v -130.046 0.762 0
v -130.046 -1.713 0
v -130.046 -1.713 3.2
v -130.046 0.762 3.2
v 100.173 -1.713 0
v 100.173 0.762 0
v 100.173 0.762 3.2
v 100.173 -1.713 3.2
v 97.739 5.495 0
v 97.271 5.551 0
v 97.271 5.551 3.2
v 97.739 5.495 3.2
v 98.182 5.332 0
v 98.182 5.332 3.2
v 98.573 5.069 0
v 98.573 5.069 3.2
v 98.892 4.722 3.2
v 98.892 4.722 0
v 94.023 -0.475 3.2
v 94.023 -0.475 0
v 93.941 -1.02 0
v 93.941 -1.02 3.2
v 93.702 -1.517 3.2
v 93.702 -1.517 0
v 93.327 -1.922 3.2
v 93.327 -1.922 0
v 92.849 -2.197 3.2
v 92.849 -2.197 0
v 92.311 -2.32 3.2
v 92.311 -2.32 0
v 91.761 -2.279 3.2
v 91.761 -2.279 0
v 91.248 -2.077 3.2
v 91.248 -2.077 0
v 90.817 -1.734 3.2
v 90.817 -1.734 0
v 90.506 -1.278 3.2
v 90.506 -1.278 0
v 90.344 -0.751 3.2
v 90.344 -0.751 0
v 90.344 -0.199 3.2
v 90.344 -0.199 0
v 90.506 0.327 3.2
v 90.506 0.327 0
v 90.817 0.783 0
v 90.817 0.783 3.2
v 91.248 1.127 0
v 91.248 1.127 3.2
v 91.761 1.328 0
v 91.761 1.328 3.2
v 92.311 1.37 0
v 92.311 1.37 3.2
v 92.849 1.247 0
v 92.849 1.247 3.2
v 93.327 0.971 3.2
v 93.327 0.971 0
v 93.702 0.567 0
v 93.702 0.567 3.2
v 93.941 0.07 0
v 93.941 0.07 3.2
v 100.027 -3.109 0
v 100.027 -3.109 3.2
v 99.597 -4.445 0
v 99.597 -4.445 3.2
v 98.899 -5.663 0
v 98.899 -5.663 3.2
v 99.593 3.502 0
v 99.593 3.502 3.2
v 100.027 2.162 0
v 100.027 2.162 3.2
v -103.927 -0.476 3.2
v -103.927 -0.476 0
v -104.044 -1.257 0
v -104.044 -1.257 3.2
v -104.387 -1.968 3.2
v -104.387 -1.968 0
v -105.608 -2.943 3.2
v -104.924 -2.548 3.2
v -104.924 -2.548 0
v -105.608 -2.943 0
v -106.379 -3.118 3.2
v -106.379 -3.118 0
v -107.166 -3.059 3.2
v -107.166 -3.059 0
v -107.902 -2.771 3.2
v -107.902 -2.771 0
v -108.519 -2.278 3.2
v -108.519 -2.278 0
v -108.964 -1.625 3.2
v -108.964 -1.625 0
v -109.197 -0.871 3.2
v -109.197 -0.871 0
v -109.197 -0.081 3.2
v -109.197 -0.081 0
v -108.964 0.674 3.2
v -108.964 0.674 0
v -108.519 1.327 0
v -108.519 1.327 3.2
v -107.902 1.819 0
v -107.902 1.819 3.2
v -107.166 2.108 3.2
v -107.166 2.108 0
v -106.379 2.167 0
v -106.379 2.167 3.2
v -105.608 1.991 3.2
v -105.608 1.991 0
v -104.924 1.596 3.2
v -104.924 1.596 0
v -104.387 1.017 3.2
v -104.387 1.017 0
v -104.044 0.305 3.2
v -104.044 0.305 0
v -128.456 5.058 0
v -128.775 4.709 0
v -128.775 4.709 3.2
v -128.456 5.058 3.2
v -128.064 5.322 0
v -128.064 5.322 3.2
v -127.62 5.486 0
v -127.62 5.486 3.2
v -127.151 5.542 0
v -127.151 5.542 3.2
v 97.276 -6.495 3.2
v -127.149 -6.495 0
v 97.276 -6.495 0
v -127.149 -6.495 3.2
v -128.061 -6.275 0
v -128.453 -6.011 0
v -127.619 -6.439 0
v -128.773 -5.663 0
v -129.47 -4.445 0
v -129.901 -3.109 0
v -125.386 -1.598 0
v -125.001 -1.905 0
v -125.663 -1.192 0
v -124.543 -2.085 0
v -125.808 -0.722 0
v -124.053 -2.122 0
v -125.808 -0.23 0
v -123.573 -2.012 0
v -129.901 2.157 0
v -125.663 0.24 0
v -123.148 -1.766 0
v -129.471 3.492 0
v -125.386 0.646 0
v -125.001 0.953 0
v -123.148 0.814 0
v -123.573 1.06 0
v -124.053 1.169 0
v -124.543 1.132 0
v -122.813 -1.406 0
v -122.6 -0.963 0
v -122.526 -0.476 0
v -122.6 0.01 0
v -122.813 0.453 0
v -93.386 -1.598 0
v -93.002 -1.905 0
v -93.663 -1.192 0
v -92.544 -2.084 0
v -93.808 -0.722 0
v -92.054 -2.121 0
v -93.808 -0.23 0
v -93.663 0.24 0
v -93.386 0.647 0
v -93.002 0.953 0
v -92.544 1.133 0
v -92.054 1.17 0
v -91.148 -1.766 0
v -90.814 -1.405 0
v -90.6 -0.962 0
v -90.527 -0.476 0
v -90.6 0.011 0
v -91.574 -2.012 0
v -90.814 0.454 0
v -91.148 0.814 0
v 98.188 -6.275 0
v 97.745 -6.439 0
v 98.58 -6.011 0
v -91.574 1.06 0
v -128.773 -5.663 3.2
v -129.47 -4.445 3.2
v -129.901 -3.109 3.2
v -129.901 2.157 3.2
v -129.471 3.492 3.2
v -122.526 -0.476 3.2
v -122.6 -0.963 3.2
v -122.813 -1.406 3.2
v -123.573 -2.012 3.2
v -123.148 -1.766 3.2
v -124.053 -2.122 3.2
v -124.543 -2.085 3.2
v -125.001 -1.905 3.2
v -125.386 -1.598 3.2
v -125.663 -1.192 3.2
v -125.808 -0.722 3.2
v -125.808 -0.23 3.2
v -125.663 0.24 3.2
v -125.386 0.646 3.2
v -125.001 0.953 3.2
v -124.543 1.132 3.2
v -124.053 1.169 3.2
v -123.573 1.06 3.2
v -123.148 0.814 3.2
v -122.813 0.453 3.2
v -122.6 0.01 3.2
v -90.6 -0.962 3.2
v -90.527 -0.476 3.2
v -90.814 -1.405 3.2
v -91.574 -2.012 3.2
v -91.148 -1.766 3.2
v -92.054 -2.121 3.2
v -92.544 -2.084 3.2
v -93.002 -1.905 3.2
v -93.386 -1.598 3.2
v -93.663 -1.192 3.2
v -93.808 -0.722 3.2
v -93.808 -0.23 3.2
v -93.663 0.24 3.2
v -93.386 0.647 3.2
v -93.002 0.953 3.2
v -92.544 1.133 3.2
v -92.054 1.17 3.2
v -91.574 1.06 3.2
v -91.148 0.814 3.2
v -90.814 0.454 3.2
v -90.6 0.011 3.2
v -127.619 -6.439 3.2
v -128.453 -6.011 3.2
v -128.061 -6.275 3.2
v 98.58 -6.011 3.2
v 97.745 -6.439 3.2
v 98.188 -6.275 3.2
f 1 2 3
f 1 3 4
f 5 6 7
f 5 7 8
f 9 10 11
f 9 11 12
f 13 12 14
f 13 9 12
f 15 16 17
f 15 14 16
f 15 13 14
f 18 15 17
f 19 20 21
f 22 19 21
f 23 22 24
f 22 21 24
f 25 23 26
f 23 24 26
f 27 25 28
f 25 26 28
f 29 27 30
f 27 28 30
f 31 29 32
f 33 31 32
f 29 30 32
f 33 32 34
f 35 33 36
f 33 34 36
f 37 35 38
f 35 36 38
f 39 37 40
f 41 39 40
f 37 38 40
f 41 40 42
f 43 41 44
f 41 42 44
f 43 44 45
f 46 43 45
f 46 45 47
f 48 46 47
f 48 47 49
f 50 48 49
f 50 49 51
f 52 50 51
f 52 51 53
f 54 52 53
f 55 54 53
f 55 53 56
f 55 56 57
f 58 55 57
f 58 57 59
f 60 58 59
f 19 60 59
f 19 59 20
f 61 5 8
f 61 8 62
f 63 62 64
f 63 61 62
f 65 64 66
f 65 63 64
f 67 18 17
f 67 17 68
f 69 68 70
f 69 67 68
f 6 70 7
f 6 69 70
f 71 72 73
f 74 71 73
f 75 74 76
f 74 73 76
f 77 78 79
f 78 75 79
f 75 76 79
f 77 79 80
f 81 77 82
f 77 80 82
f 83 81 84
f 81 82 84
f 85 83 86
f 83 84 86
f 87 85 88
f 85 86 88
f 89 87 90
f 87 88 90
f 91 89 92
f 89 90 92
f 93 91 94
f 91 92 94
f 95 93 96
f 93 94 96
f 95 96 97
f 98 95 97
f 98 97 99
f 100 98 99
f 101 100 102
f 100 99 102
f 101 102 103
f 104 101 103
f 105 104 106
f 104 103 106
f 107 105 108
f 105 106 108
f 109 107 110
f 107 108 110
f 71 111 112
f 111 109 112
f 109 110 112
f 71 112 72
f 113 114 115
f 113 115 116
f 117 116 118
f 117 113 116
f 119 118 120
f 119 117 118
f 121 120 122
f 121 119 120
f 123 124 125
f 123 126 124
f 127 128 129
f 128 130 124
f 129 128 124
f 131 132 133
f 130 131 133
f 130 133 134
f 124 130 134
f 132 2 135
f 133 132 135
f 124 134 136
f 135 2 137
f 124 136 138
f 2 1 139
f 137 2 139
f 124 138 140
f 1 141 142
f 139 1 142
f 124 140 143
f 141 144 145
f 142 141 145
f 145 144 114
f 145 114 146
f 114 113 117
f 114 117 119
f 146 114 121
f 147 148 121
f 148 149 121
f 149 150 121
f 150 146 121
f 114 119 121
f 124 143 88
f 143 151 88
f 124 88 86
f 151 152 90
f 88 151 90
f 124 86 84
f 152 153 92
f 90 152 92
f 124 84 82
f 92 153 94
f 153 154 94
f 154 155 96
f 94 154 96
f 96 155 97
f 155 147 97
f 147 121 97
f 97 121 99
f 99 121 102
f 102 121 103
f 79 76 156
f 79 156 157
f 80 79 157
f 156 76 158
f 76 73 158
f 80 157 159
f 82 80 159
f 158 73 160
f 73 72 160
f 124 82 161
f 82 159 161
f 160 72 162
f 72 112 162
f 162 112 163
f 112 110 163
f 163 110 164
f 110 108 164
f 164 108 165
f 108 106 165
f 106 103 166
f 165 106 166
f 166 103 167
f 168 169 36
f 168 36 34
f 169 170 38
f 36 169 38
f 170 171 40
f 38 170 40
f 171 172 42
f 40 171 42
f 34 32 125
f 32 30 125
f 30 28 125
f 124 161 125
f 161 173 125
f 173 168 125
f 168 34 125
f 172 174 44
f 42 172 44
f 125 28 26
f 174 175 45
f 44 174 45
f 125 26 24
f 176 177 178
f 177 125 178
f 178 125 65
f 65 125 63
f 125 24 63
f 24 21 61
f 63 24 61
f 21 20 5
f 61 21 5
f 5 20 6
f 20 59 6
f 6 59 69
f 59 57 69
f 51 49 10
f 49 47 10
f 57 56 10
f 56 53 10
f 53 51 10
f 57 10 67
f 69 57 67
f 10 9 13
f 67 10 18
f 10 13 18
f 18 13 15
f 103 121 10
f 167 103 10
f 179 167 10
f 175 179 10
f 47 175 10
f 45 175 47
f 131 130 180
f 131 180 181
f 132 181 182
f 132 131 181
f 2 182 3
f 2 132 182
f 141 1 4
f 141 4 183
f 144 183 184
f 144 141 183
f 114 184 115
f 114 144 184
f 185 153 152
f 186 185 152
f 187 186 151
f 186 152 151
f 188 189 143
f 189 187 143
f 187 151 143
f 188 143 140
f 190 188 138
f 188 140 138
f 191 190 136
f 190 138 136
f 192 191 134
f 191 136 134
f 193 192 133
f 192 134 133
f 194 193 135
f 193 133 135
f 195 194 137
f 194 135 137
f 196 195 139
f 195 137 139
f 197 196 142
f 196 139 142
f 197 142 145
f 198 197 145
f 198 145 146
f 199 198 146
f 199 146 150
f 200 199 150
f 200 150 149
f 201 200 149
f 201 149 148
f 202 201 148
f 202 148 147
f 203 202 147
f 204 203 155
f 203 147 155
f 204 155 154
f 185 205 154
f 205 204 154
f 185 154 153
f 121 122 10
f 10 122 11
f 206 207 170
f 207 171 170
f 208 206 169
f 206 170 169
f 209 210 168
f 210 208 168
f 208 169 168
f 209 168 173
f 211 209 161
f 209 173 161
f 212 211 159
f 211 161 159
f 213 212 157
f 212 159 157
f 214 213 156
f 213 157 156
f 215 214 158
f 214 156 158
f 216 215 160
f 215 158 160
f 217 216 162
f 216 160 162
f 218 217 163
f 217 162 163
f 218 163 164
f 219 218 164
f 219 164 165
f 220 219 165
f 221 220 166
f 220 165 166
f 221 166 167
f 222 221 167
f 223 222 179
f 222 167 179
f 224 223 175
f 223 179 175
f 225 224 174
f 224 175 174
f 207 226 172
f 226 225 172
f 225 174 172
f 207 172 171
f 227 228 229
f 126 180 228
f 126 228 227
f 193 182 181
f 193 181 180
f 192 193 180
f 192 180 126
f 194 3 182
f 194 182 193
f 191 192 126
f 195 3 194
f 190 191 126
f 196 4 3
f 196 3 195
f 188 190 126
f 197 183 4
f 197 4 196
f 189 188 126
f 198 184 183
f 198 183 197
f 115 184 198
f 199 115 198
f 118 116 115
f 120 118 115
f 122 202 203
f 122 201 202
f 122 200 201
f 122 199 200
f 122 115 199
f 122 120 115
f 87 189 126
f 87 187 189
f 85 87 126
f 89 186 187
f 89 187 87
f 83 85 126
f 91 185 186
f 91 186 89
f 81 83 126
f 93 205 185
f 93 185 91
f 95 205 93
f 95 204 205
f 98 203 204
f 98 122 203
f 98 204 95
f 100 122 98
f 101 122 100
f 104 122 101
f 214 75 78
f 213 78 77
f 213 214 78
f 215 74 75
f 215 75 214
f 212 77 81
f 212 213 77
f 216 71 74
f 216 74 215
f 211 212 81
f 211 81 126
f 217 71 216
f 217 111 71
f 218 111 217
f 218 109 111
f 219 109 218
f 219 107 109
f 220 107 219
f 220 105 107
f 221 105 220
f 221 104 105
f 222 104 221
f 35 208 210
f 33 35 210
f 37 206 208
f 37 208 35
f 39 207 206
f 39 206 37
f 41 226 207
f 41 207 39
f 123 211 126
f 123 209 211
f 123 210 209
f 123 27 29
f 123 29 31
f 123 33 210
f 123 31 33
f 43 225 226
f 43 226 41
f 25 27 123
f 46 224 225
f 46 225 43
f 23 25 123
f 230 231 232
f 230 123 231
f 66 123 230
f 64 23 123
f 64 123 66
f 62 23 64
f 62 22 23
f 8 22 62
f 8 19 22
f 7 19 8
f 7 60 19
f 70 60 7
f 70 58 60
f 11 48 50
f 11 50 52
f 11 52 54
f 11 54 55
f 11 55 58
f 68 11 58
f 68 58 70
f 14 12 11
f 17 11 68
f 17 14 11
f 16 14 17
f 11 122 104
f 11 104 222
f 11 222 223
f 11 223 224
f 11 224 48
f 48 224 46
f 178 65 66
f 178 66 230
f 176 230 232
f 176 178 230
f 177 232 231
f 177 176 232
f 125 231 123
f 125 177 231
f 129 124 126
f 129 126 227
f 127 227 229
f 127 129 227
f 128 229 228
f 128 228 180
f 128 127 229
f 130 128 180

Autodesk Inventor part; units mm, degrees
ref_plane "YZ Plane" through (0, 0, 0) normal (1, 0, 0) x (0, 1, 0)
ref_plane "XZ Plane" through (0, 0, 0) normal (0, 1, 0) x (-1, 0, 0)
ref_plane "XY Plane" through (0, 0, 0) normal (0, 0, 1) x (1, 0, 0)
sketch "Эскиз1" plane through (0, 0, 0) normal (0, 0, 1) x (1, 0, 0)
  arc A0 (130.1731, 0.7623) -> (123.4106, 7.5248) centre (123.4106, 0.7623) ccw
  line L0 (-123.2839, 7.5248) -> (123.4106, 7.5248)
  arc A1 (-123.2839, 7.5248) -> (-130.0464, 0.7623) centre (-123.2839, 0.7623) ccw
  line L1 (-130.0464, -1.7127) -> (-130.0464, 0.7623)
  arc A2 (-130.0464, -1.7127) -> (-123.2839, -8.4752) centre (-123.2839, -1.7127) ccw
  line L2 (123.4106, -8.4752) -> (-123.2839, -8.4752)
  arc A3 (123.4106, -8.4752) -> (130.1731, -1.7127) centre (123.4106, -1.7127) ccw
  line L3 (130.1731, 0.7623) -> (130.1731, -1.7127)
  circle A4 centre (122.1731, -0.4752) radius 1.85
  circle A5 centre (-124.1763, -0.4762) radius 1.65
  circle A6 centre (-106.5766, -0.4757) radius 2.65
  circle A7 centre (-92.1769, -0.4756) radius 1.65
  line L4 (-73.2645, 4.044) -> (-78.5234, -4.9714)
  arc A8 (-71.5369, 4.044) -> (-73.2645, 4.044) centre (-72.4007, 3.5401) ccw
  line L5 (-66.2779, -4.9714) -> (-71.5369, 4.044)
  arc A9 (-67.1417, -6.4752) -> (-66.2779, -4.9714) centre (-67.1417, -5.4752) ccw
  line L6 (-77.6596, -6.4752) -> (-67.1417, -6.4752)
  arc A10 (-78.5234, -4.9714) -> (-77.6596, -6.4752) centre (-77.6596, -5.4752) ccw
  line L7 (-57.8267, 5.5248) -> (-68.3446, 5.5248)
  arc A11 (-56.9629, 4.0209) -> (-57.8267, 5.5248) centre (-57.8267, 4.5248) ccw
  line L8 (-62.2219, -4.9945) -> (-56.9629, 4.0209)
  arc A12 (-63.9495, -4.9945) -> (-62.2219, -4.9945) centre (-63.0857, -4.4906) ccw
  line L9 (-69.2084, 4.0209) -> (-63.9495, -4.9945)
  arc A13 (-68.3446, 5.5248) -> (-69.2084, 4.0209) centre (-68.3446, 4.5248) ccw
  line L10 (-54.634, 4.044) -> (-59.893, -4.9714)
  arc A14 (-52.9065, 4.044) -> (-54.634, 4.044) centre (-53.7703, 3.5401) ccw
  line L11 (-47.6475, -4.9714) -> (-52.9065, 4.044)
  arc A15 (-48.5113, -6.4752) -> (-47.6475, -4.9714) centre (-48.5113, -5.4752) ccw
  line L12 (-59.0292, -6.4752) -> (-48.5113, -6.4752)
  arc A16 (-59.893, -4.9714) -> (-59.0292, -6.4752) centre (-59.0292, -5.4752) ccw
  line L13 (-39.1963, 5.5248) -> (-49.7142, 5.5248)
  arc A17 (-38.3325, 4.0209) -> (-39.1963, 5.5248) centre (-39.1963, 4.5248) ccw
  line L14 (-43.5915, -4.9945) -> (-38.3325, 4.0209)
  arc A18 (-45.319, -4.9945) -> (-43.5915, -4.9945) centre (-44.4553, -4.4906) ccw
  line L15 (-50.578, 4.0209) -> (-45.319, -4.9945)
  arc A19 (-49.7142, 5.5248) -> (-50.578, 4.0209) centre (-49.7142, 4.5248) ccw
  line L16 (-36.0036, 4.044) -> (-41.2626, -4.9714)
  arc A20 (-34.2761, 4.044) -> (-36.0036, 4.044) centre (-35.1399, 3.5401) ccw
  line L17 (-29.0171, -4.9714) -> (-34.2761, 4.044)
  arc A21 (-29.8809, -6.4752) -> (-29.0171, -4.9714) centre (-29.8809, -5.4752) ccw
  line L18 (-40.3988, -6.4752) -> (-29.8809, -6.4752)
  arc A22 (-41.2626, -4.9714) -> (-40.3988, -6.4752) centre (-40.3988, -5.4752) ccw
  line L19 (-20.5659, 5.5248) -> (-31.0838, 5.5248)
  arc A23 (-19.7021, 4.0209) -> (-20.5659, 5.5248) centre (-20.5659, 4.5248) ccw
  line L20 (-24.9611, -4.9945) -> (-19.7021, 4.0209)
  arc A24 (-26.6886, -4.9945) -> (-24.9611, -4.9945) centre (-25.8249, -4.4906) ccw
  line L21 (-31.9476, 4.0209) -> (-26.6886, -4.9945)
  arc A25 (-31.0838, 5.5248) -> (-31.9476, 4.0209) centre (-31.0838, 4.5248) ccw
  line L22 (-17.3732, 4.044) -> (-22.6322, -4.9714)
  arc A26 (-15.6457, 4.044) -> (-17.3732, 4.044) centre (-16.5095, 3.5401) ccw
  line L23 (-10.3867, -4.9714) -> (-15.6457, 4.044)
  arc A27 (-11.2505, -6.4752) -> (-10.3867, -4.9714) centre (-11.2505, -5.4752) ccw
  line L24 (-21.7684, -6.4752) -> (-11.2505, -6.4752)
  arc A28 (-22.6322, -4.9714) -> (-21.7684, -6.4752) centre (-21.7684, -5.4752) ccw
  line L25 (-1.9355, 5.5248) -> (-12.4534, 5.5248)
  arc A29 (-1.0717, 4.0209) -> (-1.9355, 5.5248) centre (-1.9355, 4.5248) ccw
  line L26 (-6.3307, -4.9945) -> (-1.0717, 4.0209)
  arc A30 (-8.0582, -4.9945) -> (-6.3307, -4.9945) centre (-7.1945, -4.4906) ccw
  line L27 (-13.3172, 4.0209) -> (-8.0582, -4.9945)
  arc A31 (-12.4534, 5.5248) -> (-13.3172, 4.0209) centre (-12.4534, 4.5248) ccw
  line L28 (113.0396, 4.044) -> (107.7807, -4.9714)
  arc A32 (114.7672, 4.044) -> (113.0396, 4.044) centre (113.9034, 3.5401) ccw
  line L29 (120.0261, -4.9714) -> (114.7672, 4.044)
  arc A33 (119.1624, -6.4752) -> (120.0261, -4.9714) centre (119.1624, -5.4752) ccw
  line L30 (108.6444, -6.4752) -> (119.1624, -6.4752)
  arc A34 (107.7807, -4.9714) -> (108.6444, -6.4752) centre (108.6444, -5.4752) ccw
  line L31 (1.2572, 4.044) -> (-4.0018, -4.9714)
  arc A35 (2.9847, 4.044) -> (1.2572, 4.044) centre (2.121, 3.5401) ccw
  line L32 (8.2437, -4.9714) -> (2.9847, 4.044)
  arc A36 (7.3799, -6.4752) -> (8.2437, -4.9714) centre (7.3799, -5.4752) ccw
  line L33 (-3.138, -6.4752) -> (7.3799, -6.4752)
  arc A37 (-4.0018, -4.9714) -> (-3.138, -6.4752) centre (-3.138, -5.4752) ccw
  line L34 (16.6949, 5.5248) -> (6.177, 5.5248)
  arc A38 (17.5587, 4.0209) -> (16.6949, 5.5248) centre (16.6949, 4.5248) ccw
  line L35 (12.2997, -4.9945) -> (17.5587, 4.0209)
  arc A39 (10.5722, -4.9945) -> (12.2997, -4.9945) centre (11.436, -4.4906) ccw
  line L36 (5.3132, 4.0209) -> (10.5722, -4.9945)
  arc A40 (6.177, 5.5248) -> (5.3132, 4.0209) centre (6.177, 4.5248) ccw
  line L37 (98.4652, 4.0209) -> (103.7242, -4.9945)
  arc A41 (99.329, 5.5248) -> (98.4652, 4.0209) centre (99.329, 4.5248) ccw
  line L38 (109.847, 5.5248) -> (99.329, 5.5248)
  arc A42 (110.7107, 4.0209) -> (109.847, 5.5248) centre (109.847, 4.5248) ccw
  line L39 (105.4518, -4.9945) -> (110.7107, 4.0209)
  arc A43 (103.7242, -4.9945) -> (105.4518, -4.9945) centre (104.588, -4.4906) ccw
  line L40 (94.4092, 4.044) -> (89.1502, -4.9714)
  arc A44 (96.1368, 4.044) -> (94.4092, 4.044) centre (95.273, 3.5401) ccw
  line L41 (101.3957, -4.9714) -> (96.1368, 4.044)
  arc A45 (100.532, -6.4752) -> (101.3957, -4.9714) centre (100.532, -5.4752) ccw
  line L42 (90.014, -6.4752) -> (100.532, -6.4752)
  arc A46 (89.1502, -4.9714) -> (90.014, -6.4752) centre (90.014, -5.4752) ccw
  line L43 (19.8876, 4.044) -> (14.6286, -4.9714)
  arc A47 (21.6151, 4.044) -> (19.8876, 4.044) centre (20.7514, 3.5401) ccw
  line L44 (26.8741, -4.9714) -> (21.6151, 4.044)
  arc A48 (26.0103, -6.4752) -> (26.8741, -4.9714) centre (26.0103, -5.4752) ccw
  line L45 (15.4924, -6.4752) -> (26.0103, -6.4752)
  arc A49 (14.6286, -4.9714) -> (15.4924, -6.4752) centre (15.4924, -5.4752) ccw
  line L46 (35.3253, 5.5248) -> (24.8074, 5.5248)
  arc A50 (36.1891, 4.0209) -> (35.3253, 5.5248) centre (35.3253, 4.5248) ccw
  line L47 (30.9301, -4.9945) -> (36.1891, 4.0209)
  arc A51 (29.2026, -4.9945) -> (30.9301, -4.9945) centre (30.0664, -4.4906) ccw
  line L48 (23.9436, 4.0209) -> (29.2026, -4.9945)
  arc A52 (24.8074, 5.5248) -> (23.9436, 4.0209) centre (24.8074, 4.5248) ccw
  line L49 (79.8348, 4.0209) -> (85.0938, -4.9945)
  arc A53 (80.6986, 5.5248) -> (79.8348, 4.0209) centre (80.6986, 4.5248) ccw
  line L50 (91.2165, 5.5248) -> (80.6986, 5.5248)
  arc A54 (92.0803, 4.0209) -> (91.2165, 5.5248) centre (91.2165, 4.5248) ccw
  line L51 (86.8214, -4.9945) -> (92.0803, 4.0209)
  arc A55 (85.0938, -4.9945) -> (86.8214, -4.9945) centre (85.9576, -4.4906) ccw
  line L52 (75.7788, 4.044) -> (70.5198, -4.9714)
  arc A56 (77.5064, 4.044) -> (75.7788, 4.044) centre (76.6426, 3.5401) ccw
  line L53 (82.7653, -4.9714) -> (77.5064, 4.044)
  arc A57 (81.9015, -6.4752) -> (82.7653, -4.9714) centre (81.9015, -5.4752) ccw
  line L54 (71.3836, -6.4752) -> (81.9015, -6.4752)
  arc A58 (70.5198, -4.9714) -> (71.3836, -6.4752) centre (71.3836, -5.4752) ccw
  line L55 (38.518, 4.044) -> (33.259, -4.9714)
  arc A59 (40.2455, 4.044) -> (38.518, 4.044) centre (39.3818, 3.5401) ccw
  line L56 (45.5045, -4.9714) -> (40.2455, 4.044)
  arc A60 (44.6407, -6.4752) -> (45.5045, -4.9714) centre (44.6407, -5.4752) ccw
  line L57 (34.1228, -6.4752) -> (44.6407, -6.4752)
  arc A61 (33.259, -4.9714) -> (34.1228, -6.4752) centre (34.1228, -5.4752) ccw
  line L58 (53.9557, 5.5248) -> (43.4378, 5.5248)
  arc A62 (54.8195, 4.0209) -> (53.9557, 5.5248) centre (53.9557, 4.5248) ccw
  line L59 (49.5605, -4.9945) -> (54.8195, 4.0209)
  arc A63 (47.833, -4.9945) -> (49.5605, -4.9945) centre (48.6968, -4.4906) ccw
  line L60 (42.574, 4.0209) -> (47.833, -4.9945)
  arc A64 (43.4378, 5.5248) -> (42.574, 4.0209) centre (43.4378, 4.5248) ccw
  line L61 (61.2044, 4.0209) -> (66.4634, -4.9945)
  arc A65 (62.0682, 5.5248) -> (61.2044, 4.0209) centre (62.0682, 4.5248) ccw
  line L62 (72.5861, 5.5248) -> (62.0682, 5.5248)
  arc A66 (73.4499, 4.0209) -> (72.5861, 5.5248) centre (72.5861, 4.5248) ccw
  line L63 (68.191, -4.9945) -> (73.4499, 4.0209)
  arc A67 (66.4634, -4.9945) -> (68.191, -4.9945) centre (67.3272, -4.4906) ccw
  line L64 (57.1484, 4.044) -> (51.8894, -4.9714)
  arc A68 (58.876, 4.044) -> (57.1484, 4.044) centre (58.0122, 3.5401) ccw
  line L65 (64.1349, -4.9714) -> (58.876, 4.044)
  arc A69 (63.2711, -6.4752) -> (64.1349, -4.9714) centre (63.2711, -5.4752) ccw
  line L66 (52.7532, -6.4752) -> (63.2711, -6.4752)
  arc A70 (51.8894, -4.9714) -> (52.7532, -6.4752) centre (52.7532, -5.4752) ccw
  line L67 (122.1731, -0.4752) -> (92.1731, -0.4752)
  circle A71 centre (92.1731, -0.4752) radius 1.85
  arc A72 (100.1731, 0.7623) -> (93.4106, 7.5248) centre (93.4106, 0.7623) ccw
  arc A73 (93.4106, -8.4752) -> (100.1731, -1.7127) centre (93.4106, -1.7127) ccw
  line L68 (100.1731, 0.7623) -> (100.1731, -1.7127)
  point P0 (0, 0)
  point P1 (6.1731, -0.4752)
  point P2 (93.4106, -8.4752)
  dimension "d0" = 30
extrude "Выдавливание1" add sketch "Эскиз1" along normal blind 3.2 contours A72 A41 L37 L68 L67 L41 A44 L40 A71 A46 L42 A73 L2 A2 L1 A1 L0 | A72 L37 A41 | L42 A46 L40 A71 L67 L41 A73 | L41 L67 L68 A73 | L67 A71 L40 A44 L41 | A8 L5 A9 L6 A10 L4 | A11 L8 A12 L9 A13 L7 | A14 L11 A15 L12 A16 L10 | A17 L14 A18 L15 A19 L13 | A20 L17 A21 L18 A22 L16 | A23 L20 A24 L21 A25 L19 | A26 L23 A27 L24 A28 L22 | A29 L26 A30 L27 A31 L25 | A35 L32 A36 L33 A37 L31 | A38 L35 A39 L36 A40 L34 | A47 L44 A48 L45 A49 L43 | A50 L47 A51 L48 A52 L46 | A53 L50 A54 L51 A55 L49 | A56 L53 A57 L54 A58 L52 | A59 L56 A60 L57 A61 L55 | A62 L59 A63 L60 A64 L58 | A65 L62 A66 L63 A67 L61 | A68 L65 A69 L66 A70 L64
sketch "Эскиз2" plane through (0, 0, 3.2) normal (0, 0, 1) x (1, 0, 0)
  line L0 (100.1731, -1.7127) -> (100.1731, 0.7623) projected
  arc A0 (100.1731, 0.7623) -> (93.4106, 7.5248) centre (93.4106, 0.7623) ccw projected
  line L1 (93.4106, 7.5248) -> (-123.2839, 7.5248) projected
  arc A1 (-123.2839, 7.5248) -> (-130.0464, 0.7623) centre (-123.2839, 0.7623) ccw projected
  line L2 (-130.0464, 0.7623) -> (-130.0464, -1.7127) projected
  arc A2 (-130.0464, -1.7127) -> (-123.2839, -8.4752) centre (-123.2839, -1.7127) ccw projected
  line L3 (-123.2839, -8.4752) -> (93.4106, -8.4752) projected
  arc A3 (93.4106, -8.4752) -> (100.1731, -1.7127) centre (93.4106, -1.7127) ccw projected
  circle A4 centre (92.1731, -0.4752) radius 1.85 projected
  circle A5 centre (-106.5766, -0.4757) radius 2.65 projected
  circle A6 centre (-92.1769, -0.4756) radius 1.65 projected
  circle A7 centre (-124.1763, -0.4762) radius 1.65 projected
  line L4 (-128.0657, -6.4946) -> (127, -6.4946)
  line L5 (-124.1763, -0.4762) -> (-92.1769, -0.4756)
  line L6 (-130.0464, 5.5419) -> (126.9998, 5.5522)
  point P0 (0, 0)
  point P1 (-128.0659, 5.542)
  point P2 (98.1924, -6.4946)
  point P3 (-128.0678, 5.542)
  point P4 (98.1854, 5.551)
extrude "Выдавливание2" cut sketch "Эскиз2" against normal blind 3.2 contours A3 L3 A2 L4 | L6 A1 L1 A0
fillet "Сопряжение1" radius 2 4 edges at (-128.0657, -6.4946, 1.6) (-128.0678, 5.542, 1.6) (98.1854, 5.551, 1.6) (98.1924, -6.4946, 1.6)
properties part number "ДЛЯ ПОДВЕСА"
